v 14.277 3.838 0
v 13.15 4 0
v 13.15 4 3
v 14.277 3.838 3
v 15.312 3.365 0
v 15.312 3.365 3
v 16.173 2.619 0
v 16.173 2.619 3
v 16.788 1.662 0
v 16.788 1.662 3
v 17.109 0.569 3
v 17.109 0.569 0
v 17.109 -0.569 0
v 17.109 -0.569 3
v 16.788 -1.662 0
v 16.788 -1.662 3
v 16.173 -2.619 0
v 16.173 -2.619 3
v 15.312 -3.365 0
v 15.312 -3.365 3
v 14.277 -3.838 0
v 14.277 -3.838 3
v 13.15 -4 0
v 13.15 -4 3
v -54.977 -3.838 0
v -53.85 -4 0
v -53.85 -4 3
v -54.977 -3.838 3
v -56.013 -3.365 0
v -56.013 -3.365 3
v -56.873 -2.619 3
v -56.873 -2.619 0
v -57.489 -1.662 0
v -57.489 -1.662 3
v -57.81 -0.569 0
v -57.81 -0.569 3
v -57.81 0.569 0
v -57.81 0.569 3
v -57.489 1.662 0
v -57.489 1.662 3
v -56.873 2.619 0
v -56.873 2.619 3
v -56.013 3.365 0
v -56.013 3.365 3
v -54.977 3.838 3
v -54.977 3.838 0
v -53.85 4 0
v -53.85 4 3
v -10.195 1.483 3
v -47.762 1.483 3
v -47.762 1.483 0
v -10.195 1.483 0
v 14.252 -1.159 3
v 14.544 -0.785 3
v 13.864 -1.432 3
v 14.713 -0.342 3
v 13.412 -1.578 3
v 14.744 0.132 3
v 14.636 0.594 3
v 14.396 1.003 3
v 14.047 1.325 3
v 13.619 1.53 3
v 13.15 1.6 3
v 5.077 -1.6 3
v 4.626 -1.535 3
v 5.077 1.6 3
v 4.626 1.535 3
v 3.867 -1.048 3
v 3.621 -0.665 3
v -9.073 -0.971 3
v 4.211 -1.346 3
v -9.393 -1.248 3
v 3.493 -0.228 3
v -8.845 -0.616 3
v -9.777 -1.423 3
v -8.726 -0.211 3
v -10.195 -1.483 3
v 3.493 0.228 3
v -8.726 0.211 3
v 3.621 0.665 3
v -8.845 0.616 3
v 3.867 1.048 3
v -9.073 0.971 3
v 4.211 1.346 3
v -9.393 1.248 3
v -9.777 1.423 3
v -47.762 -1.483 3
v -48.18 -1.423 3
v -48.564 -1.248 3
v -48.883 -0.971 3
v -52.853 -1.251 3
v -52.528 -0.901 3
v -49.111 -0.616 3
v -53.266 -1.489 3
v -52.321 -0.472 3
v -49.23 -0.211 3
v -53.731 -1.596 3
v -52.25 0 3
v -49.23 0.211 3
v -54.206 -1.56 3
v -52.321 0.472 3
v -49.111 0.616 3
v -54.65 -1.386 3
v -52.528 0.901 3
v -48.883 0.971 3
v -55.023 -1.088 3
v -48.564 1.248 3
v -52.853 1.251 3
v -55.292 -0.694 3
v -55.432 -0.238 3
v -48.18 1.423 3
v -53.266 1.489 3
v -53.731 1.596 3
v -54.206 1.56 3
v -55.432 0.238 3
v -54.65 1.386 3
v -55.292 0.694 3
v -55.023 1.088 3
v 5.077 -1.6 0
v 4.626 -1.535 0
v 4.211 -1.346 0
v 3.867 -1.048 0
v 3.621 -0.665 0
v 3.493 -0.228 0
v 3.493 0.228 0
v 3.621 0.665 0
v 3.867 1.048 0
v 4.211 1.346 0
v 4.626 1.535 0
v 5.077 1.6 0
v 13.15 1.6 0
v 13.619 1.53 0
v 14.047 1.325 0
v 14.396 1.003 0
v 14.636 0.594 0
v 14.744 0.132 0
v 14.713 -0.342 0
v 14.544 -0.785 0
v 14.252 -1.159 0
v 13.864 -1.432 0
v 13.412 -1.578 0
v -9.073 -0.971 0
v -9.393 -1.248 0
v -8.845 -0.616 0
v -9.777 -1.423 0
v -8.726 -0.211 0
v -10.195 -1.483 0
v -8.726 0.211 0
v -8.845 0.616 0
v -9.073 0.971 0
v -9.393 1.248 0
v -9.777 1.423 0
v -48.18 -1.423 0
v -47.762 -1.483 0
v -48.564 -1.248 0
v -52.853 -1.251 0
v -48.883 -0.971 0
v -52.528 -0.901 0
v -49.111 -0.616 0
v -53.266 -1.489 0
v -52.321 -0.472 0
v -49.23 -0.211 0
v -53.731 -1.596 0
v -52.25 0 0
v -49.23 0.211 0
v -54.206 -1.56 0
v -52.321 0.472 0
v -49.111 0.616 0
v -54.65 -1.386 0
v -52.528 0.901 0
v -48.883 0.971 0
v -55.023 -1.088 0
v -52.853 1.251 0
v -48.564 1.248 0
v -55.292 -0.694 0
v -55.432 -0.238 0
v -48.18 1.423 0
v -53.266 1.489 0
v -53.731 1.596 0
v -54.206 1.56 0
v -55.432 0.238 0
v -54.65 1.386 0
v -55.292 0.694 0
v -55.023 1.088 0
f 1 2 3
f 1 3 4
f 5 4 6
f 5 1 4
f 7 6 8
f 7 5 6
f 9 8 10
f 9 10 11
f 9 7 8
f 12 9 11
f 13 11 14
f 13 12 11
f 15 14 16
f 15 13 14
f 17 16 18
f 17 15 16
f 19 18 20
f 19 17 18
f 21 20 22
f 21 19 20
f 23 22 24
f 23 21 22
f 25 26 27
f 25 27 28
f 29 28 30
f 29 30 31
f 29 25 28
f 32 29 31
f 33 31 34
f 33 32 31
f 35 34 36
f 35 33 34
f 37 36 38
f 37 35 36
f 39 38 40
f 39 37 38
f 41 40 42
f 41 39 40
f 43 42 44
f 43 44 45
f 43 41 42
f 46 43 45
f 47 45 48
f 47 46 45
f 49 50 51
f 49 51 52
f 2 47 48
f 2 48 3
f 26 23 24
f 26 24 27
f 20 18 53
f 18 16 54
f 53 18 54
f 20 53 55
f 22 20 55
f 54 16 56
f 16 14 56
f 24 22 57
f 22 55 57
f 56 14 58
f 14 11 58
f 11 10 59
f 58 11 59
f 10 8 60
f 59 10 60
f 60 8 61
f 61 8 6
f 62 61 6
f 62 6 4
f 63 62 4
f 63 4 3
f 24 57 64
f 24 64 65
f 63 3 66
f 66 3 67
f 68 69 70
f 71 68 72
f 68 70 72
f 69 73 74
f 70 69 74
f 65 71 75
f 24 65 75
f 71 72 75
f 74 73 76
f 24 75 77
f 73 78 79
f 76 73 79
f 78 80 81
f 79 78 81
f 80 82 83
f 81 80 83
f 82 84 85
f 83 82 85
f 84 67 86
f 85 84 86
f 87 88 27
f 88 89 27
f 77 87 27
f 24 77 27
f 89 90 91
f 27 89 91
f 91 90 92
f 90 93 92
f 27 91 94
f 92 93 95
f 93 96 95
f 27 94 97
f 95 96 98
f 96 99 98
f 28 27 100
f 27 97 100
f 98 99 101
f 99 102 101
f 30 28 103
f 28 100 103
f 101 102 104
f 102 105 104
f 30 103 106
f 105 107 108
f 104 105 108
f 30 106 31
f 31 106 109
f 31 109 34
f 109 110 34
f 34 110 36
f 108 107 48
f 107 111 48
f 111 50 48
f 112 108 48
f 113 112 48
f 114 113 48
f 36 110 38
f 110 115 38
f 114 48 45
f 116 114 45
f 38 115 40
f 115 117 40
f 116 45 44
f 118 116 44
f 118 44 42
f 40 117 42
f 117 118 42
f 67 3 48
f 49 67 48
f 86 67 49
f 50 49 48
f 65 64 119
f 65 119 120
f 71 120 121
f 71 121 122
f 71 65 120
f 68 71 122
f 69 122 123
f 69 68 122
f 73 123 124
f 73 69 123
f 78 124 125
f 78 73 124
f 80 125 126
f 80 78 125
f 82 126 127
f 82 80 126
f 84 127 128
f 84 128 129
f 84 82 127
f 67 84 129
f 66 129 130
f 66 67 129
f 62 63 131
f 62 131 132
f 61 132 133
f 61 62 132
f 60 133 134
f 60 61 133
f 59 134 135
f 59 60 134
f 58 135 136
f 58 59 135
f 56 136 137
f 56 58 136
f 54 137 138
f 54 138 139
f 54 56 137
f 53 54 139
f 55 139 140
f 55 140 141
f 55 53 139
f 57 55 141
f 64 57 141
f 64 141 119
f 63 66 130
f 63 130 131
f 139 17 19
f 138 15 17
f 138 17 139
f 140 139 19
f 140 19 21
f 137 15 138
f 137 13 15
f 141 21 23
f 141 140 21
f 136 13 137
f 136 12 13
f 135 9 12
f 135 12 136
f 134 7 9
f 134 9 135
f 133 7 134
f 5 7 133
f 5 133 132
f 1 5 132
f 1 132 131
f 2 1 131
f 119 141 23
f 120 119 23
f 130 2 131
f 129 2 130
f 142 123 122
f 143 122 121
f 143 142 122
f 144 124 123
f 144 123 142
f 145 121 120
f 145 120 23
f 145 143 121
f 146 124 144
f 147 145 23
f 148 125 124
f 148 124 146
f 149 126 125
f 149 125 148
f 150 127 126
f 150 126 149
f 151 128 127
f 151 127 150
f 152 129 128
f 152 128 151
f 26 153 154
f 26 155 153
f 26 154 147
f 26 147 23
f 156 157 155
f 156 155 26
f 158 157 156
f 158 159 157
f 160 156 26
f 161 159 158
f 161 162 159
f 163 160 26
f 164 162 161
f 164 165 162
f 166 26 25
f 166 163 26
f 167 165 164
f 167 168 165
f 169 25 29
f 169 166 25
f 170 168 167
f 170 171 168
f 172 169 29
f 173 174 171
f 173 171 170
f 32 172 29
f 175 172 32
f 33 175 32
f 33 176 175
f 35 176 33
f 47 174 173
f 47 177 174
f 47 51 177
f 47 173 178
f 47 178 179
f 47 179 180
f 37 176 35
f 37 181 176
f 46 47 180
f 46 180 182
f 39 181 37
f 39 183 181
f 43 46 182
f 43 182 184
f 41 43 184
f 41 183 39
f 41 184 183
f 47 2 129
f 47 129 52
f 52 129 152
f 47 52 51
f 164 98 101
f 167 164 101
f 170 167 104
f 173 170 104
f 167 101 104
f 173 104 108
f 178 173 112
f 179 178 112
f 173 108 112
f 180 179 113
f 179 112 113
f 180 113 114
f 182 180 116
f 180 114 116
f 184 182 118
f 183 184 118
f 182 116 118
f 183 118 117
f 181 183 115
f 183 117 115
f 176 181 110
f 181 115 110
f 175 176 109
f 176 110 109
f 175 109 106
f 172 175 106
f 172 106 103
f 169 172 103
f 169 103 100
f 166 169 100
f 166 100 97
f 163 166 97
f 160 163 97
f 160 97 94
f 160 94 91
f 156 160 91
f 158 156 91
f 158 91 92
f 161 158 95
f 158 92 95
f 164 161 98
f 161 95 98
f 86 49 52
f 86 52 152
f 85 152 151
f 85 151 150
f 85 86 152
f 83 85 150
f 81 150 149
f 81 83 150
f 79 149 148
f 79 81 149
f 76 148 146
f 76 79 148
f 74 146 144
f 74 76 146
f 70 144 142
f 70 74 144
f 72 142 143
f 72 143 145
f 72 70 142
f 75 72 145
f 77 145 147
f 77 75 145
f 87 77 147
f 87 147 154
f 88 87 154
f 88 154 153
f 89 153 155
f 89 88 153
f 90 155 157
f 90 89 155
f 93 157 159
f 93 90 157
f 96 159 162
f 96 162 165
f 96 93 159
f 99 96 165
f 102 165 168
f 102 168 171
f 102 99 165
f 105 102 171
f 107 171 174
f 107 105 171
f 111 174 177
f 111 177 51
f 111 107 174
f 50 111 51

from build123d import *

# Parameters (mm, degrees)
EXTRUDE_1_DEPTH     = 3
SKETCH_7_R          = 1.6
CUT_EXTRUDE_1_DEPTH = 3


with BuildPart() as part:
    # 草图1 → 凸台-拉伸1 (new body)
    with BuildSketch(Plane.XY):
        with BuildLine():
            Line((-53.850242828, 4), (13.149757172, 4))
            ThreePointArc((13.149757172, 4), (17.149757172, 0), (13.149757172, -4))
            Line((13.149757172, -4), (-53.850242828, -4))
            ThreePointArc((-53.850242828, -4), (-57.850242828, 0), (-53.850242828, 4))
        make_face()
    extrude(amount=EXTRUDE_1_DEPTH)

    # 草图7 → 切除-拉伸1 (cut)
    with BuildSketch(Plane.XY.offset(3)):
        with Locations((-53.850242828, 0)):
            Circle(SKETCH_7_R)
        with BuildLine():
            Line((-47.761926325, 1.483471582), (-10.194558278, 1.483471582))
            ThreePointArc((-10.194558278, 1.483471582), (-8.711086696, 0), (-10.194558278, -1.483471582))
            Line((-10.194558278, -1.483471582), (-47.761926325, -1.483471582))
            ThreePointArc((-47.761926325, -1.483471582), (-49.245397907, 0), (-47.761926325, 1.483471582))
        make_face()
        with BuildLine():
            Line((5.076512497, 1.6), (13.149757172, 1.6))
            ThreePointArc((13.149757172, 1.6), (14.744323235, 0.131753831), (13.412369906, -1.57830116))
            Line((13.412369906, -1.57830116), (5.076512497, -1.6))
            ThreePointArc((5.076512497, -1.6), (3.476512497, 0), (5.076512497, 1.6))
        make_face()
    extrude(amount=-CUT_EXTRUDE_1_DEPTH, mode=Mode.SUBTRACT)


solid = part.part
